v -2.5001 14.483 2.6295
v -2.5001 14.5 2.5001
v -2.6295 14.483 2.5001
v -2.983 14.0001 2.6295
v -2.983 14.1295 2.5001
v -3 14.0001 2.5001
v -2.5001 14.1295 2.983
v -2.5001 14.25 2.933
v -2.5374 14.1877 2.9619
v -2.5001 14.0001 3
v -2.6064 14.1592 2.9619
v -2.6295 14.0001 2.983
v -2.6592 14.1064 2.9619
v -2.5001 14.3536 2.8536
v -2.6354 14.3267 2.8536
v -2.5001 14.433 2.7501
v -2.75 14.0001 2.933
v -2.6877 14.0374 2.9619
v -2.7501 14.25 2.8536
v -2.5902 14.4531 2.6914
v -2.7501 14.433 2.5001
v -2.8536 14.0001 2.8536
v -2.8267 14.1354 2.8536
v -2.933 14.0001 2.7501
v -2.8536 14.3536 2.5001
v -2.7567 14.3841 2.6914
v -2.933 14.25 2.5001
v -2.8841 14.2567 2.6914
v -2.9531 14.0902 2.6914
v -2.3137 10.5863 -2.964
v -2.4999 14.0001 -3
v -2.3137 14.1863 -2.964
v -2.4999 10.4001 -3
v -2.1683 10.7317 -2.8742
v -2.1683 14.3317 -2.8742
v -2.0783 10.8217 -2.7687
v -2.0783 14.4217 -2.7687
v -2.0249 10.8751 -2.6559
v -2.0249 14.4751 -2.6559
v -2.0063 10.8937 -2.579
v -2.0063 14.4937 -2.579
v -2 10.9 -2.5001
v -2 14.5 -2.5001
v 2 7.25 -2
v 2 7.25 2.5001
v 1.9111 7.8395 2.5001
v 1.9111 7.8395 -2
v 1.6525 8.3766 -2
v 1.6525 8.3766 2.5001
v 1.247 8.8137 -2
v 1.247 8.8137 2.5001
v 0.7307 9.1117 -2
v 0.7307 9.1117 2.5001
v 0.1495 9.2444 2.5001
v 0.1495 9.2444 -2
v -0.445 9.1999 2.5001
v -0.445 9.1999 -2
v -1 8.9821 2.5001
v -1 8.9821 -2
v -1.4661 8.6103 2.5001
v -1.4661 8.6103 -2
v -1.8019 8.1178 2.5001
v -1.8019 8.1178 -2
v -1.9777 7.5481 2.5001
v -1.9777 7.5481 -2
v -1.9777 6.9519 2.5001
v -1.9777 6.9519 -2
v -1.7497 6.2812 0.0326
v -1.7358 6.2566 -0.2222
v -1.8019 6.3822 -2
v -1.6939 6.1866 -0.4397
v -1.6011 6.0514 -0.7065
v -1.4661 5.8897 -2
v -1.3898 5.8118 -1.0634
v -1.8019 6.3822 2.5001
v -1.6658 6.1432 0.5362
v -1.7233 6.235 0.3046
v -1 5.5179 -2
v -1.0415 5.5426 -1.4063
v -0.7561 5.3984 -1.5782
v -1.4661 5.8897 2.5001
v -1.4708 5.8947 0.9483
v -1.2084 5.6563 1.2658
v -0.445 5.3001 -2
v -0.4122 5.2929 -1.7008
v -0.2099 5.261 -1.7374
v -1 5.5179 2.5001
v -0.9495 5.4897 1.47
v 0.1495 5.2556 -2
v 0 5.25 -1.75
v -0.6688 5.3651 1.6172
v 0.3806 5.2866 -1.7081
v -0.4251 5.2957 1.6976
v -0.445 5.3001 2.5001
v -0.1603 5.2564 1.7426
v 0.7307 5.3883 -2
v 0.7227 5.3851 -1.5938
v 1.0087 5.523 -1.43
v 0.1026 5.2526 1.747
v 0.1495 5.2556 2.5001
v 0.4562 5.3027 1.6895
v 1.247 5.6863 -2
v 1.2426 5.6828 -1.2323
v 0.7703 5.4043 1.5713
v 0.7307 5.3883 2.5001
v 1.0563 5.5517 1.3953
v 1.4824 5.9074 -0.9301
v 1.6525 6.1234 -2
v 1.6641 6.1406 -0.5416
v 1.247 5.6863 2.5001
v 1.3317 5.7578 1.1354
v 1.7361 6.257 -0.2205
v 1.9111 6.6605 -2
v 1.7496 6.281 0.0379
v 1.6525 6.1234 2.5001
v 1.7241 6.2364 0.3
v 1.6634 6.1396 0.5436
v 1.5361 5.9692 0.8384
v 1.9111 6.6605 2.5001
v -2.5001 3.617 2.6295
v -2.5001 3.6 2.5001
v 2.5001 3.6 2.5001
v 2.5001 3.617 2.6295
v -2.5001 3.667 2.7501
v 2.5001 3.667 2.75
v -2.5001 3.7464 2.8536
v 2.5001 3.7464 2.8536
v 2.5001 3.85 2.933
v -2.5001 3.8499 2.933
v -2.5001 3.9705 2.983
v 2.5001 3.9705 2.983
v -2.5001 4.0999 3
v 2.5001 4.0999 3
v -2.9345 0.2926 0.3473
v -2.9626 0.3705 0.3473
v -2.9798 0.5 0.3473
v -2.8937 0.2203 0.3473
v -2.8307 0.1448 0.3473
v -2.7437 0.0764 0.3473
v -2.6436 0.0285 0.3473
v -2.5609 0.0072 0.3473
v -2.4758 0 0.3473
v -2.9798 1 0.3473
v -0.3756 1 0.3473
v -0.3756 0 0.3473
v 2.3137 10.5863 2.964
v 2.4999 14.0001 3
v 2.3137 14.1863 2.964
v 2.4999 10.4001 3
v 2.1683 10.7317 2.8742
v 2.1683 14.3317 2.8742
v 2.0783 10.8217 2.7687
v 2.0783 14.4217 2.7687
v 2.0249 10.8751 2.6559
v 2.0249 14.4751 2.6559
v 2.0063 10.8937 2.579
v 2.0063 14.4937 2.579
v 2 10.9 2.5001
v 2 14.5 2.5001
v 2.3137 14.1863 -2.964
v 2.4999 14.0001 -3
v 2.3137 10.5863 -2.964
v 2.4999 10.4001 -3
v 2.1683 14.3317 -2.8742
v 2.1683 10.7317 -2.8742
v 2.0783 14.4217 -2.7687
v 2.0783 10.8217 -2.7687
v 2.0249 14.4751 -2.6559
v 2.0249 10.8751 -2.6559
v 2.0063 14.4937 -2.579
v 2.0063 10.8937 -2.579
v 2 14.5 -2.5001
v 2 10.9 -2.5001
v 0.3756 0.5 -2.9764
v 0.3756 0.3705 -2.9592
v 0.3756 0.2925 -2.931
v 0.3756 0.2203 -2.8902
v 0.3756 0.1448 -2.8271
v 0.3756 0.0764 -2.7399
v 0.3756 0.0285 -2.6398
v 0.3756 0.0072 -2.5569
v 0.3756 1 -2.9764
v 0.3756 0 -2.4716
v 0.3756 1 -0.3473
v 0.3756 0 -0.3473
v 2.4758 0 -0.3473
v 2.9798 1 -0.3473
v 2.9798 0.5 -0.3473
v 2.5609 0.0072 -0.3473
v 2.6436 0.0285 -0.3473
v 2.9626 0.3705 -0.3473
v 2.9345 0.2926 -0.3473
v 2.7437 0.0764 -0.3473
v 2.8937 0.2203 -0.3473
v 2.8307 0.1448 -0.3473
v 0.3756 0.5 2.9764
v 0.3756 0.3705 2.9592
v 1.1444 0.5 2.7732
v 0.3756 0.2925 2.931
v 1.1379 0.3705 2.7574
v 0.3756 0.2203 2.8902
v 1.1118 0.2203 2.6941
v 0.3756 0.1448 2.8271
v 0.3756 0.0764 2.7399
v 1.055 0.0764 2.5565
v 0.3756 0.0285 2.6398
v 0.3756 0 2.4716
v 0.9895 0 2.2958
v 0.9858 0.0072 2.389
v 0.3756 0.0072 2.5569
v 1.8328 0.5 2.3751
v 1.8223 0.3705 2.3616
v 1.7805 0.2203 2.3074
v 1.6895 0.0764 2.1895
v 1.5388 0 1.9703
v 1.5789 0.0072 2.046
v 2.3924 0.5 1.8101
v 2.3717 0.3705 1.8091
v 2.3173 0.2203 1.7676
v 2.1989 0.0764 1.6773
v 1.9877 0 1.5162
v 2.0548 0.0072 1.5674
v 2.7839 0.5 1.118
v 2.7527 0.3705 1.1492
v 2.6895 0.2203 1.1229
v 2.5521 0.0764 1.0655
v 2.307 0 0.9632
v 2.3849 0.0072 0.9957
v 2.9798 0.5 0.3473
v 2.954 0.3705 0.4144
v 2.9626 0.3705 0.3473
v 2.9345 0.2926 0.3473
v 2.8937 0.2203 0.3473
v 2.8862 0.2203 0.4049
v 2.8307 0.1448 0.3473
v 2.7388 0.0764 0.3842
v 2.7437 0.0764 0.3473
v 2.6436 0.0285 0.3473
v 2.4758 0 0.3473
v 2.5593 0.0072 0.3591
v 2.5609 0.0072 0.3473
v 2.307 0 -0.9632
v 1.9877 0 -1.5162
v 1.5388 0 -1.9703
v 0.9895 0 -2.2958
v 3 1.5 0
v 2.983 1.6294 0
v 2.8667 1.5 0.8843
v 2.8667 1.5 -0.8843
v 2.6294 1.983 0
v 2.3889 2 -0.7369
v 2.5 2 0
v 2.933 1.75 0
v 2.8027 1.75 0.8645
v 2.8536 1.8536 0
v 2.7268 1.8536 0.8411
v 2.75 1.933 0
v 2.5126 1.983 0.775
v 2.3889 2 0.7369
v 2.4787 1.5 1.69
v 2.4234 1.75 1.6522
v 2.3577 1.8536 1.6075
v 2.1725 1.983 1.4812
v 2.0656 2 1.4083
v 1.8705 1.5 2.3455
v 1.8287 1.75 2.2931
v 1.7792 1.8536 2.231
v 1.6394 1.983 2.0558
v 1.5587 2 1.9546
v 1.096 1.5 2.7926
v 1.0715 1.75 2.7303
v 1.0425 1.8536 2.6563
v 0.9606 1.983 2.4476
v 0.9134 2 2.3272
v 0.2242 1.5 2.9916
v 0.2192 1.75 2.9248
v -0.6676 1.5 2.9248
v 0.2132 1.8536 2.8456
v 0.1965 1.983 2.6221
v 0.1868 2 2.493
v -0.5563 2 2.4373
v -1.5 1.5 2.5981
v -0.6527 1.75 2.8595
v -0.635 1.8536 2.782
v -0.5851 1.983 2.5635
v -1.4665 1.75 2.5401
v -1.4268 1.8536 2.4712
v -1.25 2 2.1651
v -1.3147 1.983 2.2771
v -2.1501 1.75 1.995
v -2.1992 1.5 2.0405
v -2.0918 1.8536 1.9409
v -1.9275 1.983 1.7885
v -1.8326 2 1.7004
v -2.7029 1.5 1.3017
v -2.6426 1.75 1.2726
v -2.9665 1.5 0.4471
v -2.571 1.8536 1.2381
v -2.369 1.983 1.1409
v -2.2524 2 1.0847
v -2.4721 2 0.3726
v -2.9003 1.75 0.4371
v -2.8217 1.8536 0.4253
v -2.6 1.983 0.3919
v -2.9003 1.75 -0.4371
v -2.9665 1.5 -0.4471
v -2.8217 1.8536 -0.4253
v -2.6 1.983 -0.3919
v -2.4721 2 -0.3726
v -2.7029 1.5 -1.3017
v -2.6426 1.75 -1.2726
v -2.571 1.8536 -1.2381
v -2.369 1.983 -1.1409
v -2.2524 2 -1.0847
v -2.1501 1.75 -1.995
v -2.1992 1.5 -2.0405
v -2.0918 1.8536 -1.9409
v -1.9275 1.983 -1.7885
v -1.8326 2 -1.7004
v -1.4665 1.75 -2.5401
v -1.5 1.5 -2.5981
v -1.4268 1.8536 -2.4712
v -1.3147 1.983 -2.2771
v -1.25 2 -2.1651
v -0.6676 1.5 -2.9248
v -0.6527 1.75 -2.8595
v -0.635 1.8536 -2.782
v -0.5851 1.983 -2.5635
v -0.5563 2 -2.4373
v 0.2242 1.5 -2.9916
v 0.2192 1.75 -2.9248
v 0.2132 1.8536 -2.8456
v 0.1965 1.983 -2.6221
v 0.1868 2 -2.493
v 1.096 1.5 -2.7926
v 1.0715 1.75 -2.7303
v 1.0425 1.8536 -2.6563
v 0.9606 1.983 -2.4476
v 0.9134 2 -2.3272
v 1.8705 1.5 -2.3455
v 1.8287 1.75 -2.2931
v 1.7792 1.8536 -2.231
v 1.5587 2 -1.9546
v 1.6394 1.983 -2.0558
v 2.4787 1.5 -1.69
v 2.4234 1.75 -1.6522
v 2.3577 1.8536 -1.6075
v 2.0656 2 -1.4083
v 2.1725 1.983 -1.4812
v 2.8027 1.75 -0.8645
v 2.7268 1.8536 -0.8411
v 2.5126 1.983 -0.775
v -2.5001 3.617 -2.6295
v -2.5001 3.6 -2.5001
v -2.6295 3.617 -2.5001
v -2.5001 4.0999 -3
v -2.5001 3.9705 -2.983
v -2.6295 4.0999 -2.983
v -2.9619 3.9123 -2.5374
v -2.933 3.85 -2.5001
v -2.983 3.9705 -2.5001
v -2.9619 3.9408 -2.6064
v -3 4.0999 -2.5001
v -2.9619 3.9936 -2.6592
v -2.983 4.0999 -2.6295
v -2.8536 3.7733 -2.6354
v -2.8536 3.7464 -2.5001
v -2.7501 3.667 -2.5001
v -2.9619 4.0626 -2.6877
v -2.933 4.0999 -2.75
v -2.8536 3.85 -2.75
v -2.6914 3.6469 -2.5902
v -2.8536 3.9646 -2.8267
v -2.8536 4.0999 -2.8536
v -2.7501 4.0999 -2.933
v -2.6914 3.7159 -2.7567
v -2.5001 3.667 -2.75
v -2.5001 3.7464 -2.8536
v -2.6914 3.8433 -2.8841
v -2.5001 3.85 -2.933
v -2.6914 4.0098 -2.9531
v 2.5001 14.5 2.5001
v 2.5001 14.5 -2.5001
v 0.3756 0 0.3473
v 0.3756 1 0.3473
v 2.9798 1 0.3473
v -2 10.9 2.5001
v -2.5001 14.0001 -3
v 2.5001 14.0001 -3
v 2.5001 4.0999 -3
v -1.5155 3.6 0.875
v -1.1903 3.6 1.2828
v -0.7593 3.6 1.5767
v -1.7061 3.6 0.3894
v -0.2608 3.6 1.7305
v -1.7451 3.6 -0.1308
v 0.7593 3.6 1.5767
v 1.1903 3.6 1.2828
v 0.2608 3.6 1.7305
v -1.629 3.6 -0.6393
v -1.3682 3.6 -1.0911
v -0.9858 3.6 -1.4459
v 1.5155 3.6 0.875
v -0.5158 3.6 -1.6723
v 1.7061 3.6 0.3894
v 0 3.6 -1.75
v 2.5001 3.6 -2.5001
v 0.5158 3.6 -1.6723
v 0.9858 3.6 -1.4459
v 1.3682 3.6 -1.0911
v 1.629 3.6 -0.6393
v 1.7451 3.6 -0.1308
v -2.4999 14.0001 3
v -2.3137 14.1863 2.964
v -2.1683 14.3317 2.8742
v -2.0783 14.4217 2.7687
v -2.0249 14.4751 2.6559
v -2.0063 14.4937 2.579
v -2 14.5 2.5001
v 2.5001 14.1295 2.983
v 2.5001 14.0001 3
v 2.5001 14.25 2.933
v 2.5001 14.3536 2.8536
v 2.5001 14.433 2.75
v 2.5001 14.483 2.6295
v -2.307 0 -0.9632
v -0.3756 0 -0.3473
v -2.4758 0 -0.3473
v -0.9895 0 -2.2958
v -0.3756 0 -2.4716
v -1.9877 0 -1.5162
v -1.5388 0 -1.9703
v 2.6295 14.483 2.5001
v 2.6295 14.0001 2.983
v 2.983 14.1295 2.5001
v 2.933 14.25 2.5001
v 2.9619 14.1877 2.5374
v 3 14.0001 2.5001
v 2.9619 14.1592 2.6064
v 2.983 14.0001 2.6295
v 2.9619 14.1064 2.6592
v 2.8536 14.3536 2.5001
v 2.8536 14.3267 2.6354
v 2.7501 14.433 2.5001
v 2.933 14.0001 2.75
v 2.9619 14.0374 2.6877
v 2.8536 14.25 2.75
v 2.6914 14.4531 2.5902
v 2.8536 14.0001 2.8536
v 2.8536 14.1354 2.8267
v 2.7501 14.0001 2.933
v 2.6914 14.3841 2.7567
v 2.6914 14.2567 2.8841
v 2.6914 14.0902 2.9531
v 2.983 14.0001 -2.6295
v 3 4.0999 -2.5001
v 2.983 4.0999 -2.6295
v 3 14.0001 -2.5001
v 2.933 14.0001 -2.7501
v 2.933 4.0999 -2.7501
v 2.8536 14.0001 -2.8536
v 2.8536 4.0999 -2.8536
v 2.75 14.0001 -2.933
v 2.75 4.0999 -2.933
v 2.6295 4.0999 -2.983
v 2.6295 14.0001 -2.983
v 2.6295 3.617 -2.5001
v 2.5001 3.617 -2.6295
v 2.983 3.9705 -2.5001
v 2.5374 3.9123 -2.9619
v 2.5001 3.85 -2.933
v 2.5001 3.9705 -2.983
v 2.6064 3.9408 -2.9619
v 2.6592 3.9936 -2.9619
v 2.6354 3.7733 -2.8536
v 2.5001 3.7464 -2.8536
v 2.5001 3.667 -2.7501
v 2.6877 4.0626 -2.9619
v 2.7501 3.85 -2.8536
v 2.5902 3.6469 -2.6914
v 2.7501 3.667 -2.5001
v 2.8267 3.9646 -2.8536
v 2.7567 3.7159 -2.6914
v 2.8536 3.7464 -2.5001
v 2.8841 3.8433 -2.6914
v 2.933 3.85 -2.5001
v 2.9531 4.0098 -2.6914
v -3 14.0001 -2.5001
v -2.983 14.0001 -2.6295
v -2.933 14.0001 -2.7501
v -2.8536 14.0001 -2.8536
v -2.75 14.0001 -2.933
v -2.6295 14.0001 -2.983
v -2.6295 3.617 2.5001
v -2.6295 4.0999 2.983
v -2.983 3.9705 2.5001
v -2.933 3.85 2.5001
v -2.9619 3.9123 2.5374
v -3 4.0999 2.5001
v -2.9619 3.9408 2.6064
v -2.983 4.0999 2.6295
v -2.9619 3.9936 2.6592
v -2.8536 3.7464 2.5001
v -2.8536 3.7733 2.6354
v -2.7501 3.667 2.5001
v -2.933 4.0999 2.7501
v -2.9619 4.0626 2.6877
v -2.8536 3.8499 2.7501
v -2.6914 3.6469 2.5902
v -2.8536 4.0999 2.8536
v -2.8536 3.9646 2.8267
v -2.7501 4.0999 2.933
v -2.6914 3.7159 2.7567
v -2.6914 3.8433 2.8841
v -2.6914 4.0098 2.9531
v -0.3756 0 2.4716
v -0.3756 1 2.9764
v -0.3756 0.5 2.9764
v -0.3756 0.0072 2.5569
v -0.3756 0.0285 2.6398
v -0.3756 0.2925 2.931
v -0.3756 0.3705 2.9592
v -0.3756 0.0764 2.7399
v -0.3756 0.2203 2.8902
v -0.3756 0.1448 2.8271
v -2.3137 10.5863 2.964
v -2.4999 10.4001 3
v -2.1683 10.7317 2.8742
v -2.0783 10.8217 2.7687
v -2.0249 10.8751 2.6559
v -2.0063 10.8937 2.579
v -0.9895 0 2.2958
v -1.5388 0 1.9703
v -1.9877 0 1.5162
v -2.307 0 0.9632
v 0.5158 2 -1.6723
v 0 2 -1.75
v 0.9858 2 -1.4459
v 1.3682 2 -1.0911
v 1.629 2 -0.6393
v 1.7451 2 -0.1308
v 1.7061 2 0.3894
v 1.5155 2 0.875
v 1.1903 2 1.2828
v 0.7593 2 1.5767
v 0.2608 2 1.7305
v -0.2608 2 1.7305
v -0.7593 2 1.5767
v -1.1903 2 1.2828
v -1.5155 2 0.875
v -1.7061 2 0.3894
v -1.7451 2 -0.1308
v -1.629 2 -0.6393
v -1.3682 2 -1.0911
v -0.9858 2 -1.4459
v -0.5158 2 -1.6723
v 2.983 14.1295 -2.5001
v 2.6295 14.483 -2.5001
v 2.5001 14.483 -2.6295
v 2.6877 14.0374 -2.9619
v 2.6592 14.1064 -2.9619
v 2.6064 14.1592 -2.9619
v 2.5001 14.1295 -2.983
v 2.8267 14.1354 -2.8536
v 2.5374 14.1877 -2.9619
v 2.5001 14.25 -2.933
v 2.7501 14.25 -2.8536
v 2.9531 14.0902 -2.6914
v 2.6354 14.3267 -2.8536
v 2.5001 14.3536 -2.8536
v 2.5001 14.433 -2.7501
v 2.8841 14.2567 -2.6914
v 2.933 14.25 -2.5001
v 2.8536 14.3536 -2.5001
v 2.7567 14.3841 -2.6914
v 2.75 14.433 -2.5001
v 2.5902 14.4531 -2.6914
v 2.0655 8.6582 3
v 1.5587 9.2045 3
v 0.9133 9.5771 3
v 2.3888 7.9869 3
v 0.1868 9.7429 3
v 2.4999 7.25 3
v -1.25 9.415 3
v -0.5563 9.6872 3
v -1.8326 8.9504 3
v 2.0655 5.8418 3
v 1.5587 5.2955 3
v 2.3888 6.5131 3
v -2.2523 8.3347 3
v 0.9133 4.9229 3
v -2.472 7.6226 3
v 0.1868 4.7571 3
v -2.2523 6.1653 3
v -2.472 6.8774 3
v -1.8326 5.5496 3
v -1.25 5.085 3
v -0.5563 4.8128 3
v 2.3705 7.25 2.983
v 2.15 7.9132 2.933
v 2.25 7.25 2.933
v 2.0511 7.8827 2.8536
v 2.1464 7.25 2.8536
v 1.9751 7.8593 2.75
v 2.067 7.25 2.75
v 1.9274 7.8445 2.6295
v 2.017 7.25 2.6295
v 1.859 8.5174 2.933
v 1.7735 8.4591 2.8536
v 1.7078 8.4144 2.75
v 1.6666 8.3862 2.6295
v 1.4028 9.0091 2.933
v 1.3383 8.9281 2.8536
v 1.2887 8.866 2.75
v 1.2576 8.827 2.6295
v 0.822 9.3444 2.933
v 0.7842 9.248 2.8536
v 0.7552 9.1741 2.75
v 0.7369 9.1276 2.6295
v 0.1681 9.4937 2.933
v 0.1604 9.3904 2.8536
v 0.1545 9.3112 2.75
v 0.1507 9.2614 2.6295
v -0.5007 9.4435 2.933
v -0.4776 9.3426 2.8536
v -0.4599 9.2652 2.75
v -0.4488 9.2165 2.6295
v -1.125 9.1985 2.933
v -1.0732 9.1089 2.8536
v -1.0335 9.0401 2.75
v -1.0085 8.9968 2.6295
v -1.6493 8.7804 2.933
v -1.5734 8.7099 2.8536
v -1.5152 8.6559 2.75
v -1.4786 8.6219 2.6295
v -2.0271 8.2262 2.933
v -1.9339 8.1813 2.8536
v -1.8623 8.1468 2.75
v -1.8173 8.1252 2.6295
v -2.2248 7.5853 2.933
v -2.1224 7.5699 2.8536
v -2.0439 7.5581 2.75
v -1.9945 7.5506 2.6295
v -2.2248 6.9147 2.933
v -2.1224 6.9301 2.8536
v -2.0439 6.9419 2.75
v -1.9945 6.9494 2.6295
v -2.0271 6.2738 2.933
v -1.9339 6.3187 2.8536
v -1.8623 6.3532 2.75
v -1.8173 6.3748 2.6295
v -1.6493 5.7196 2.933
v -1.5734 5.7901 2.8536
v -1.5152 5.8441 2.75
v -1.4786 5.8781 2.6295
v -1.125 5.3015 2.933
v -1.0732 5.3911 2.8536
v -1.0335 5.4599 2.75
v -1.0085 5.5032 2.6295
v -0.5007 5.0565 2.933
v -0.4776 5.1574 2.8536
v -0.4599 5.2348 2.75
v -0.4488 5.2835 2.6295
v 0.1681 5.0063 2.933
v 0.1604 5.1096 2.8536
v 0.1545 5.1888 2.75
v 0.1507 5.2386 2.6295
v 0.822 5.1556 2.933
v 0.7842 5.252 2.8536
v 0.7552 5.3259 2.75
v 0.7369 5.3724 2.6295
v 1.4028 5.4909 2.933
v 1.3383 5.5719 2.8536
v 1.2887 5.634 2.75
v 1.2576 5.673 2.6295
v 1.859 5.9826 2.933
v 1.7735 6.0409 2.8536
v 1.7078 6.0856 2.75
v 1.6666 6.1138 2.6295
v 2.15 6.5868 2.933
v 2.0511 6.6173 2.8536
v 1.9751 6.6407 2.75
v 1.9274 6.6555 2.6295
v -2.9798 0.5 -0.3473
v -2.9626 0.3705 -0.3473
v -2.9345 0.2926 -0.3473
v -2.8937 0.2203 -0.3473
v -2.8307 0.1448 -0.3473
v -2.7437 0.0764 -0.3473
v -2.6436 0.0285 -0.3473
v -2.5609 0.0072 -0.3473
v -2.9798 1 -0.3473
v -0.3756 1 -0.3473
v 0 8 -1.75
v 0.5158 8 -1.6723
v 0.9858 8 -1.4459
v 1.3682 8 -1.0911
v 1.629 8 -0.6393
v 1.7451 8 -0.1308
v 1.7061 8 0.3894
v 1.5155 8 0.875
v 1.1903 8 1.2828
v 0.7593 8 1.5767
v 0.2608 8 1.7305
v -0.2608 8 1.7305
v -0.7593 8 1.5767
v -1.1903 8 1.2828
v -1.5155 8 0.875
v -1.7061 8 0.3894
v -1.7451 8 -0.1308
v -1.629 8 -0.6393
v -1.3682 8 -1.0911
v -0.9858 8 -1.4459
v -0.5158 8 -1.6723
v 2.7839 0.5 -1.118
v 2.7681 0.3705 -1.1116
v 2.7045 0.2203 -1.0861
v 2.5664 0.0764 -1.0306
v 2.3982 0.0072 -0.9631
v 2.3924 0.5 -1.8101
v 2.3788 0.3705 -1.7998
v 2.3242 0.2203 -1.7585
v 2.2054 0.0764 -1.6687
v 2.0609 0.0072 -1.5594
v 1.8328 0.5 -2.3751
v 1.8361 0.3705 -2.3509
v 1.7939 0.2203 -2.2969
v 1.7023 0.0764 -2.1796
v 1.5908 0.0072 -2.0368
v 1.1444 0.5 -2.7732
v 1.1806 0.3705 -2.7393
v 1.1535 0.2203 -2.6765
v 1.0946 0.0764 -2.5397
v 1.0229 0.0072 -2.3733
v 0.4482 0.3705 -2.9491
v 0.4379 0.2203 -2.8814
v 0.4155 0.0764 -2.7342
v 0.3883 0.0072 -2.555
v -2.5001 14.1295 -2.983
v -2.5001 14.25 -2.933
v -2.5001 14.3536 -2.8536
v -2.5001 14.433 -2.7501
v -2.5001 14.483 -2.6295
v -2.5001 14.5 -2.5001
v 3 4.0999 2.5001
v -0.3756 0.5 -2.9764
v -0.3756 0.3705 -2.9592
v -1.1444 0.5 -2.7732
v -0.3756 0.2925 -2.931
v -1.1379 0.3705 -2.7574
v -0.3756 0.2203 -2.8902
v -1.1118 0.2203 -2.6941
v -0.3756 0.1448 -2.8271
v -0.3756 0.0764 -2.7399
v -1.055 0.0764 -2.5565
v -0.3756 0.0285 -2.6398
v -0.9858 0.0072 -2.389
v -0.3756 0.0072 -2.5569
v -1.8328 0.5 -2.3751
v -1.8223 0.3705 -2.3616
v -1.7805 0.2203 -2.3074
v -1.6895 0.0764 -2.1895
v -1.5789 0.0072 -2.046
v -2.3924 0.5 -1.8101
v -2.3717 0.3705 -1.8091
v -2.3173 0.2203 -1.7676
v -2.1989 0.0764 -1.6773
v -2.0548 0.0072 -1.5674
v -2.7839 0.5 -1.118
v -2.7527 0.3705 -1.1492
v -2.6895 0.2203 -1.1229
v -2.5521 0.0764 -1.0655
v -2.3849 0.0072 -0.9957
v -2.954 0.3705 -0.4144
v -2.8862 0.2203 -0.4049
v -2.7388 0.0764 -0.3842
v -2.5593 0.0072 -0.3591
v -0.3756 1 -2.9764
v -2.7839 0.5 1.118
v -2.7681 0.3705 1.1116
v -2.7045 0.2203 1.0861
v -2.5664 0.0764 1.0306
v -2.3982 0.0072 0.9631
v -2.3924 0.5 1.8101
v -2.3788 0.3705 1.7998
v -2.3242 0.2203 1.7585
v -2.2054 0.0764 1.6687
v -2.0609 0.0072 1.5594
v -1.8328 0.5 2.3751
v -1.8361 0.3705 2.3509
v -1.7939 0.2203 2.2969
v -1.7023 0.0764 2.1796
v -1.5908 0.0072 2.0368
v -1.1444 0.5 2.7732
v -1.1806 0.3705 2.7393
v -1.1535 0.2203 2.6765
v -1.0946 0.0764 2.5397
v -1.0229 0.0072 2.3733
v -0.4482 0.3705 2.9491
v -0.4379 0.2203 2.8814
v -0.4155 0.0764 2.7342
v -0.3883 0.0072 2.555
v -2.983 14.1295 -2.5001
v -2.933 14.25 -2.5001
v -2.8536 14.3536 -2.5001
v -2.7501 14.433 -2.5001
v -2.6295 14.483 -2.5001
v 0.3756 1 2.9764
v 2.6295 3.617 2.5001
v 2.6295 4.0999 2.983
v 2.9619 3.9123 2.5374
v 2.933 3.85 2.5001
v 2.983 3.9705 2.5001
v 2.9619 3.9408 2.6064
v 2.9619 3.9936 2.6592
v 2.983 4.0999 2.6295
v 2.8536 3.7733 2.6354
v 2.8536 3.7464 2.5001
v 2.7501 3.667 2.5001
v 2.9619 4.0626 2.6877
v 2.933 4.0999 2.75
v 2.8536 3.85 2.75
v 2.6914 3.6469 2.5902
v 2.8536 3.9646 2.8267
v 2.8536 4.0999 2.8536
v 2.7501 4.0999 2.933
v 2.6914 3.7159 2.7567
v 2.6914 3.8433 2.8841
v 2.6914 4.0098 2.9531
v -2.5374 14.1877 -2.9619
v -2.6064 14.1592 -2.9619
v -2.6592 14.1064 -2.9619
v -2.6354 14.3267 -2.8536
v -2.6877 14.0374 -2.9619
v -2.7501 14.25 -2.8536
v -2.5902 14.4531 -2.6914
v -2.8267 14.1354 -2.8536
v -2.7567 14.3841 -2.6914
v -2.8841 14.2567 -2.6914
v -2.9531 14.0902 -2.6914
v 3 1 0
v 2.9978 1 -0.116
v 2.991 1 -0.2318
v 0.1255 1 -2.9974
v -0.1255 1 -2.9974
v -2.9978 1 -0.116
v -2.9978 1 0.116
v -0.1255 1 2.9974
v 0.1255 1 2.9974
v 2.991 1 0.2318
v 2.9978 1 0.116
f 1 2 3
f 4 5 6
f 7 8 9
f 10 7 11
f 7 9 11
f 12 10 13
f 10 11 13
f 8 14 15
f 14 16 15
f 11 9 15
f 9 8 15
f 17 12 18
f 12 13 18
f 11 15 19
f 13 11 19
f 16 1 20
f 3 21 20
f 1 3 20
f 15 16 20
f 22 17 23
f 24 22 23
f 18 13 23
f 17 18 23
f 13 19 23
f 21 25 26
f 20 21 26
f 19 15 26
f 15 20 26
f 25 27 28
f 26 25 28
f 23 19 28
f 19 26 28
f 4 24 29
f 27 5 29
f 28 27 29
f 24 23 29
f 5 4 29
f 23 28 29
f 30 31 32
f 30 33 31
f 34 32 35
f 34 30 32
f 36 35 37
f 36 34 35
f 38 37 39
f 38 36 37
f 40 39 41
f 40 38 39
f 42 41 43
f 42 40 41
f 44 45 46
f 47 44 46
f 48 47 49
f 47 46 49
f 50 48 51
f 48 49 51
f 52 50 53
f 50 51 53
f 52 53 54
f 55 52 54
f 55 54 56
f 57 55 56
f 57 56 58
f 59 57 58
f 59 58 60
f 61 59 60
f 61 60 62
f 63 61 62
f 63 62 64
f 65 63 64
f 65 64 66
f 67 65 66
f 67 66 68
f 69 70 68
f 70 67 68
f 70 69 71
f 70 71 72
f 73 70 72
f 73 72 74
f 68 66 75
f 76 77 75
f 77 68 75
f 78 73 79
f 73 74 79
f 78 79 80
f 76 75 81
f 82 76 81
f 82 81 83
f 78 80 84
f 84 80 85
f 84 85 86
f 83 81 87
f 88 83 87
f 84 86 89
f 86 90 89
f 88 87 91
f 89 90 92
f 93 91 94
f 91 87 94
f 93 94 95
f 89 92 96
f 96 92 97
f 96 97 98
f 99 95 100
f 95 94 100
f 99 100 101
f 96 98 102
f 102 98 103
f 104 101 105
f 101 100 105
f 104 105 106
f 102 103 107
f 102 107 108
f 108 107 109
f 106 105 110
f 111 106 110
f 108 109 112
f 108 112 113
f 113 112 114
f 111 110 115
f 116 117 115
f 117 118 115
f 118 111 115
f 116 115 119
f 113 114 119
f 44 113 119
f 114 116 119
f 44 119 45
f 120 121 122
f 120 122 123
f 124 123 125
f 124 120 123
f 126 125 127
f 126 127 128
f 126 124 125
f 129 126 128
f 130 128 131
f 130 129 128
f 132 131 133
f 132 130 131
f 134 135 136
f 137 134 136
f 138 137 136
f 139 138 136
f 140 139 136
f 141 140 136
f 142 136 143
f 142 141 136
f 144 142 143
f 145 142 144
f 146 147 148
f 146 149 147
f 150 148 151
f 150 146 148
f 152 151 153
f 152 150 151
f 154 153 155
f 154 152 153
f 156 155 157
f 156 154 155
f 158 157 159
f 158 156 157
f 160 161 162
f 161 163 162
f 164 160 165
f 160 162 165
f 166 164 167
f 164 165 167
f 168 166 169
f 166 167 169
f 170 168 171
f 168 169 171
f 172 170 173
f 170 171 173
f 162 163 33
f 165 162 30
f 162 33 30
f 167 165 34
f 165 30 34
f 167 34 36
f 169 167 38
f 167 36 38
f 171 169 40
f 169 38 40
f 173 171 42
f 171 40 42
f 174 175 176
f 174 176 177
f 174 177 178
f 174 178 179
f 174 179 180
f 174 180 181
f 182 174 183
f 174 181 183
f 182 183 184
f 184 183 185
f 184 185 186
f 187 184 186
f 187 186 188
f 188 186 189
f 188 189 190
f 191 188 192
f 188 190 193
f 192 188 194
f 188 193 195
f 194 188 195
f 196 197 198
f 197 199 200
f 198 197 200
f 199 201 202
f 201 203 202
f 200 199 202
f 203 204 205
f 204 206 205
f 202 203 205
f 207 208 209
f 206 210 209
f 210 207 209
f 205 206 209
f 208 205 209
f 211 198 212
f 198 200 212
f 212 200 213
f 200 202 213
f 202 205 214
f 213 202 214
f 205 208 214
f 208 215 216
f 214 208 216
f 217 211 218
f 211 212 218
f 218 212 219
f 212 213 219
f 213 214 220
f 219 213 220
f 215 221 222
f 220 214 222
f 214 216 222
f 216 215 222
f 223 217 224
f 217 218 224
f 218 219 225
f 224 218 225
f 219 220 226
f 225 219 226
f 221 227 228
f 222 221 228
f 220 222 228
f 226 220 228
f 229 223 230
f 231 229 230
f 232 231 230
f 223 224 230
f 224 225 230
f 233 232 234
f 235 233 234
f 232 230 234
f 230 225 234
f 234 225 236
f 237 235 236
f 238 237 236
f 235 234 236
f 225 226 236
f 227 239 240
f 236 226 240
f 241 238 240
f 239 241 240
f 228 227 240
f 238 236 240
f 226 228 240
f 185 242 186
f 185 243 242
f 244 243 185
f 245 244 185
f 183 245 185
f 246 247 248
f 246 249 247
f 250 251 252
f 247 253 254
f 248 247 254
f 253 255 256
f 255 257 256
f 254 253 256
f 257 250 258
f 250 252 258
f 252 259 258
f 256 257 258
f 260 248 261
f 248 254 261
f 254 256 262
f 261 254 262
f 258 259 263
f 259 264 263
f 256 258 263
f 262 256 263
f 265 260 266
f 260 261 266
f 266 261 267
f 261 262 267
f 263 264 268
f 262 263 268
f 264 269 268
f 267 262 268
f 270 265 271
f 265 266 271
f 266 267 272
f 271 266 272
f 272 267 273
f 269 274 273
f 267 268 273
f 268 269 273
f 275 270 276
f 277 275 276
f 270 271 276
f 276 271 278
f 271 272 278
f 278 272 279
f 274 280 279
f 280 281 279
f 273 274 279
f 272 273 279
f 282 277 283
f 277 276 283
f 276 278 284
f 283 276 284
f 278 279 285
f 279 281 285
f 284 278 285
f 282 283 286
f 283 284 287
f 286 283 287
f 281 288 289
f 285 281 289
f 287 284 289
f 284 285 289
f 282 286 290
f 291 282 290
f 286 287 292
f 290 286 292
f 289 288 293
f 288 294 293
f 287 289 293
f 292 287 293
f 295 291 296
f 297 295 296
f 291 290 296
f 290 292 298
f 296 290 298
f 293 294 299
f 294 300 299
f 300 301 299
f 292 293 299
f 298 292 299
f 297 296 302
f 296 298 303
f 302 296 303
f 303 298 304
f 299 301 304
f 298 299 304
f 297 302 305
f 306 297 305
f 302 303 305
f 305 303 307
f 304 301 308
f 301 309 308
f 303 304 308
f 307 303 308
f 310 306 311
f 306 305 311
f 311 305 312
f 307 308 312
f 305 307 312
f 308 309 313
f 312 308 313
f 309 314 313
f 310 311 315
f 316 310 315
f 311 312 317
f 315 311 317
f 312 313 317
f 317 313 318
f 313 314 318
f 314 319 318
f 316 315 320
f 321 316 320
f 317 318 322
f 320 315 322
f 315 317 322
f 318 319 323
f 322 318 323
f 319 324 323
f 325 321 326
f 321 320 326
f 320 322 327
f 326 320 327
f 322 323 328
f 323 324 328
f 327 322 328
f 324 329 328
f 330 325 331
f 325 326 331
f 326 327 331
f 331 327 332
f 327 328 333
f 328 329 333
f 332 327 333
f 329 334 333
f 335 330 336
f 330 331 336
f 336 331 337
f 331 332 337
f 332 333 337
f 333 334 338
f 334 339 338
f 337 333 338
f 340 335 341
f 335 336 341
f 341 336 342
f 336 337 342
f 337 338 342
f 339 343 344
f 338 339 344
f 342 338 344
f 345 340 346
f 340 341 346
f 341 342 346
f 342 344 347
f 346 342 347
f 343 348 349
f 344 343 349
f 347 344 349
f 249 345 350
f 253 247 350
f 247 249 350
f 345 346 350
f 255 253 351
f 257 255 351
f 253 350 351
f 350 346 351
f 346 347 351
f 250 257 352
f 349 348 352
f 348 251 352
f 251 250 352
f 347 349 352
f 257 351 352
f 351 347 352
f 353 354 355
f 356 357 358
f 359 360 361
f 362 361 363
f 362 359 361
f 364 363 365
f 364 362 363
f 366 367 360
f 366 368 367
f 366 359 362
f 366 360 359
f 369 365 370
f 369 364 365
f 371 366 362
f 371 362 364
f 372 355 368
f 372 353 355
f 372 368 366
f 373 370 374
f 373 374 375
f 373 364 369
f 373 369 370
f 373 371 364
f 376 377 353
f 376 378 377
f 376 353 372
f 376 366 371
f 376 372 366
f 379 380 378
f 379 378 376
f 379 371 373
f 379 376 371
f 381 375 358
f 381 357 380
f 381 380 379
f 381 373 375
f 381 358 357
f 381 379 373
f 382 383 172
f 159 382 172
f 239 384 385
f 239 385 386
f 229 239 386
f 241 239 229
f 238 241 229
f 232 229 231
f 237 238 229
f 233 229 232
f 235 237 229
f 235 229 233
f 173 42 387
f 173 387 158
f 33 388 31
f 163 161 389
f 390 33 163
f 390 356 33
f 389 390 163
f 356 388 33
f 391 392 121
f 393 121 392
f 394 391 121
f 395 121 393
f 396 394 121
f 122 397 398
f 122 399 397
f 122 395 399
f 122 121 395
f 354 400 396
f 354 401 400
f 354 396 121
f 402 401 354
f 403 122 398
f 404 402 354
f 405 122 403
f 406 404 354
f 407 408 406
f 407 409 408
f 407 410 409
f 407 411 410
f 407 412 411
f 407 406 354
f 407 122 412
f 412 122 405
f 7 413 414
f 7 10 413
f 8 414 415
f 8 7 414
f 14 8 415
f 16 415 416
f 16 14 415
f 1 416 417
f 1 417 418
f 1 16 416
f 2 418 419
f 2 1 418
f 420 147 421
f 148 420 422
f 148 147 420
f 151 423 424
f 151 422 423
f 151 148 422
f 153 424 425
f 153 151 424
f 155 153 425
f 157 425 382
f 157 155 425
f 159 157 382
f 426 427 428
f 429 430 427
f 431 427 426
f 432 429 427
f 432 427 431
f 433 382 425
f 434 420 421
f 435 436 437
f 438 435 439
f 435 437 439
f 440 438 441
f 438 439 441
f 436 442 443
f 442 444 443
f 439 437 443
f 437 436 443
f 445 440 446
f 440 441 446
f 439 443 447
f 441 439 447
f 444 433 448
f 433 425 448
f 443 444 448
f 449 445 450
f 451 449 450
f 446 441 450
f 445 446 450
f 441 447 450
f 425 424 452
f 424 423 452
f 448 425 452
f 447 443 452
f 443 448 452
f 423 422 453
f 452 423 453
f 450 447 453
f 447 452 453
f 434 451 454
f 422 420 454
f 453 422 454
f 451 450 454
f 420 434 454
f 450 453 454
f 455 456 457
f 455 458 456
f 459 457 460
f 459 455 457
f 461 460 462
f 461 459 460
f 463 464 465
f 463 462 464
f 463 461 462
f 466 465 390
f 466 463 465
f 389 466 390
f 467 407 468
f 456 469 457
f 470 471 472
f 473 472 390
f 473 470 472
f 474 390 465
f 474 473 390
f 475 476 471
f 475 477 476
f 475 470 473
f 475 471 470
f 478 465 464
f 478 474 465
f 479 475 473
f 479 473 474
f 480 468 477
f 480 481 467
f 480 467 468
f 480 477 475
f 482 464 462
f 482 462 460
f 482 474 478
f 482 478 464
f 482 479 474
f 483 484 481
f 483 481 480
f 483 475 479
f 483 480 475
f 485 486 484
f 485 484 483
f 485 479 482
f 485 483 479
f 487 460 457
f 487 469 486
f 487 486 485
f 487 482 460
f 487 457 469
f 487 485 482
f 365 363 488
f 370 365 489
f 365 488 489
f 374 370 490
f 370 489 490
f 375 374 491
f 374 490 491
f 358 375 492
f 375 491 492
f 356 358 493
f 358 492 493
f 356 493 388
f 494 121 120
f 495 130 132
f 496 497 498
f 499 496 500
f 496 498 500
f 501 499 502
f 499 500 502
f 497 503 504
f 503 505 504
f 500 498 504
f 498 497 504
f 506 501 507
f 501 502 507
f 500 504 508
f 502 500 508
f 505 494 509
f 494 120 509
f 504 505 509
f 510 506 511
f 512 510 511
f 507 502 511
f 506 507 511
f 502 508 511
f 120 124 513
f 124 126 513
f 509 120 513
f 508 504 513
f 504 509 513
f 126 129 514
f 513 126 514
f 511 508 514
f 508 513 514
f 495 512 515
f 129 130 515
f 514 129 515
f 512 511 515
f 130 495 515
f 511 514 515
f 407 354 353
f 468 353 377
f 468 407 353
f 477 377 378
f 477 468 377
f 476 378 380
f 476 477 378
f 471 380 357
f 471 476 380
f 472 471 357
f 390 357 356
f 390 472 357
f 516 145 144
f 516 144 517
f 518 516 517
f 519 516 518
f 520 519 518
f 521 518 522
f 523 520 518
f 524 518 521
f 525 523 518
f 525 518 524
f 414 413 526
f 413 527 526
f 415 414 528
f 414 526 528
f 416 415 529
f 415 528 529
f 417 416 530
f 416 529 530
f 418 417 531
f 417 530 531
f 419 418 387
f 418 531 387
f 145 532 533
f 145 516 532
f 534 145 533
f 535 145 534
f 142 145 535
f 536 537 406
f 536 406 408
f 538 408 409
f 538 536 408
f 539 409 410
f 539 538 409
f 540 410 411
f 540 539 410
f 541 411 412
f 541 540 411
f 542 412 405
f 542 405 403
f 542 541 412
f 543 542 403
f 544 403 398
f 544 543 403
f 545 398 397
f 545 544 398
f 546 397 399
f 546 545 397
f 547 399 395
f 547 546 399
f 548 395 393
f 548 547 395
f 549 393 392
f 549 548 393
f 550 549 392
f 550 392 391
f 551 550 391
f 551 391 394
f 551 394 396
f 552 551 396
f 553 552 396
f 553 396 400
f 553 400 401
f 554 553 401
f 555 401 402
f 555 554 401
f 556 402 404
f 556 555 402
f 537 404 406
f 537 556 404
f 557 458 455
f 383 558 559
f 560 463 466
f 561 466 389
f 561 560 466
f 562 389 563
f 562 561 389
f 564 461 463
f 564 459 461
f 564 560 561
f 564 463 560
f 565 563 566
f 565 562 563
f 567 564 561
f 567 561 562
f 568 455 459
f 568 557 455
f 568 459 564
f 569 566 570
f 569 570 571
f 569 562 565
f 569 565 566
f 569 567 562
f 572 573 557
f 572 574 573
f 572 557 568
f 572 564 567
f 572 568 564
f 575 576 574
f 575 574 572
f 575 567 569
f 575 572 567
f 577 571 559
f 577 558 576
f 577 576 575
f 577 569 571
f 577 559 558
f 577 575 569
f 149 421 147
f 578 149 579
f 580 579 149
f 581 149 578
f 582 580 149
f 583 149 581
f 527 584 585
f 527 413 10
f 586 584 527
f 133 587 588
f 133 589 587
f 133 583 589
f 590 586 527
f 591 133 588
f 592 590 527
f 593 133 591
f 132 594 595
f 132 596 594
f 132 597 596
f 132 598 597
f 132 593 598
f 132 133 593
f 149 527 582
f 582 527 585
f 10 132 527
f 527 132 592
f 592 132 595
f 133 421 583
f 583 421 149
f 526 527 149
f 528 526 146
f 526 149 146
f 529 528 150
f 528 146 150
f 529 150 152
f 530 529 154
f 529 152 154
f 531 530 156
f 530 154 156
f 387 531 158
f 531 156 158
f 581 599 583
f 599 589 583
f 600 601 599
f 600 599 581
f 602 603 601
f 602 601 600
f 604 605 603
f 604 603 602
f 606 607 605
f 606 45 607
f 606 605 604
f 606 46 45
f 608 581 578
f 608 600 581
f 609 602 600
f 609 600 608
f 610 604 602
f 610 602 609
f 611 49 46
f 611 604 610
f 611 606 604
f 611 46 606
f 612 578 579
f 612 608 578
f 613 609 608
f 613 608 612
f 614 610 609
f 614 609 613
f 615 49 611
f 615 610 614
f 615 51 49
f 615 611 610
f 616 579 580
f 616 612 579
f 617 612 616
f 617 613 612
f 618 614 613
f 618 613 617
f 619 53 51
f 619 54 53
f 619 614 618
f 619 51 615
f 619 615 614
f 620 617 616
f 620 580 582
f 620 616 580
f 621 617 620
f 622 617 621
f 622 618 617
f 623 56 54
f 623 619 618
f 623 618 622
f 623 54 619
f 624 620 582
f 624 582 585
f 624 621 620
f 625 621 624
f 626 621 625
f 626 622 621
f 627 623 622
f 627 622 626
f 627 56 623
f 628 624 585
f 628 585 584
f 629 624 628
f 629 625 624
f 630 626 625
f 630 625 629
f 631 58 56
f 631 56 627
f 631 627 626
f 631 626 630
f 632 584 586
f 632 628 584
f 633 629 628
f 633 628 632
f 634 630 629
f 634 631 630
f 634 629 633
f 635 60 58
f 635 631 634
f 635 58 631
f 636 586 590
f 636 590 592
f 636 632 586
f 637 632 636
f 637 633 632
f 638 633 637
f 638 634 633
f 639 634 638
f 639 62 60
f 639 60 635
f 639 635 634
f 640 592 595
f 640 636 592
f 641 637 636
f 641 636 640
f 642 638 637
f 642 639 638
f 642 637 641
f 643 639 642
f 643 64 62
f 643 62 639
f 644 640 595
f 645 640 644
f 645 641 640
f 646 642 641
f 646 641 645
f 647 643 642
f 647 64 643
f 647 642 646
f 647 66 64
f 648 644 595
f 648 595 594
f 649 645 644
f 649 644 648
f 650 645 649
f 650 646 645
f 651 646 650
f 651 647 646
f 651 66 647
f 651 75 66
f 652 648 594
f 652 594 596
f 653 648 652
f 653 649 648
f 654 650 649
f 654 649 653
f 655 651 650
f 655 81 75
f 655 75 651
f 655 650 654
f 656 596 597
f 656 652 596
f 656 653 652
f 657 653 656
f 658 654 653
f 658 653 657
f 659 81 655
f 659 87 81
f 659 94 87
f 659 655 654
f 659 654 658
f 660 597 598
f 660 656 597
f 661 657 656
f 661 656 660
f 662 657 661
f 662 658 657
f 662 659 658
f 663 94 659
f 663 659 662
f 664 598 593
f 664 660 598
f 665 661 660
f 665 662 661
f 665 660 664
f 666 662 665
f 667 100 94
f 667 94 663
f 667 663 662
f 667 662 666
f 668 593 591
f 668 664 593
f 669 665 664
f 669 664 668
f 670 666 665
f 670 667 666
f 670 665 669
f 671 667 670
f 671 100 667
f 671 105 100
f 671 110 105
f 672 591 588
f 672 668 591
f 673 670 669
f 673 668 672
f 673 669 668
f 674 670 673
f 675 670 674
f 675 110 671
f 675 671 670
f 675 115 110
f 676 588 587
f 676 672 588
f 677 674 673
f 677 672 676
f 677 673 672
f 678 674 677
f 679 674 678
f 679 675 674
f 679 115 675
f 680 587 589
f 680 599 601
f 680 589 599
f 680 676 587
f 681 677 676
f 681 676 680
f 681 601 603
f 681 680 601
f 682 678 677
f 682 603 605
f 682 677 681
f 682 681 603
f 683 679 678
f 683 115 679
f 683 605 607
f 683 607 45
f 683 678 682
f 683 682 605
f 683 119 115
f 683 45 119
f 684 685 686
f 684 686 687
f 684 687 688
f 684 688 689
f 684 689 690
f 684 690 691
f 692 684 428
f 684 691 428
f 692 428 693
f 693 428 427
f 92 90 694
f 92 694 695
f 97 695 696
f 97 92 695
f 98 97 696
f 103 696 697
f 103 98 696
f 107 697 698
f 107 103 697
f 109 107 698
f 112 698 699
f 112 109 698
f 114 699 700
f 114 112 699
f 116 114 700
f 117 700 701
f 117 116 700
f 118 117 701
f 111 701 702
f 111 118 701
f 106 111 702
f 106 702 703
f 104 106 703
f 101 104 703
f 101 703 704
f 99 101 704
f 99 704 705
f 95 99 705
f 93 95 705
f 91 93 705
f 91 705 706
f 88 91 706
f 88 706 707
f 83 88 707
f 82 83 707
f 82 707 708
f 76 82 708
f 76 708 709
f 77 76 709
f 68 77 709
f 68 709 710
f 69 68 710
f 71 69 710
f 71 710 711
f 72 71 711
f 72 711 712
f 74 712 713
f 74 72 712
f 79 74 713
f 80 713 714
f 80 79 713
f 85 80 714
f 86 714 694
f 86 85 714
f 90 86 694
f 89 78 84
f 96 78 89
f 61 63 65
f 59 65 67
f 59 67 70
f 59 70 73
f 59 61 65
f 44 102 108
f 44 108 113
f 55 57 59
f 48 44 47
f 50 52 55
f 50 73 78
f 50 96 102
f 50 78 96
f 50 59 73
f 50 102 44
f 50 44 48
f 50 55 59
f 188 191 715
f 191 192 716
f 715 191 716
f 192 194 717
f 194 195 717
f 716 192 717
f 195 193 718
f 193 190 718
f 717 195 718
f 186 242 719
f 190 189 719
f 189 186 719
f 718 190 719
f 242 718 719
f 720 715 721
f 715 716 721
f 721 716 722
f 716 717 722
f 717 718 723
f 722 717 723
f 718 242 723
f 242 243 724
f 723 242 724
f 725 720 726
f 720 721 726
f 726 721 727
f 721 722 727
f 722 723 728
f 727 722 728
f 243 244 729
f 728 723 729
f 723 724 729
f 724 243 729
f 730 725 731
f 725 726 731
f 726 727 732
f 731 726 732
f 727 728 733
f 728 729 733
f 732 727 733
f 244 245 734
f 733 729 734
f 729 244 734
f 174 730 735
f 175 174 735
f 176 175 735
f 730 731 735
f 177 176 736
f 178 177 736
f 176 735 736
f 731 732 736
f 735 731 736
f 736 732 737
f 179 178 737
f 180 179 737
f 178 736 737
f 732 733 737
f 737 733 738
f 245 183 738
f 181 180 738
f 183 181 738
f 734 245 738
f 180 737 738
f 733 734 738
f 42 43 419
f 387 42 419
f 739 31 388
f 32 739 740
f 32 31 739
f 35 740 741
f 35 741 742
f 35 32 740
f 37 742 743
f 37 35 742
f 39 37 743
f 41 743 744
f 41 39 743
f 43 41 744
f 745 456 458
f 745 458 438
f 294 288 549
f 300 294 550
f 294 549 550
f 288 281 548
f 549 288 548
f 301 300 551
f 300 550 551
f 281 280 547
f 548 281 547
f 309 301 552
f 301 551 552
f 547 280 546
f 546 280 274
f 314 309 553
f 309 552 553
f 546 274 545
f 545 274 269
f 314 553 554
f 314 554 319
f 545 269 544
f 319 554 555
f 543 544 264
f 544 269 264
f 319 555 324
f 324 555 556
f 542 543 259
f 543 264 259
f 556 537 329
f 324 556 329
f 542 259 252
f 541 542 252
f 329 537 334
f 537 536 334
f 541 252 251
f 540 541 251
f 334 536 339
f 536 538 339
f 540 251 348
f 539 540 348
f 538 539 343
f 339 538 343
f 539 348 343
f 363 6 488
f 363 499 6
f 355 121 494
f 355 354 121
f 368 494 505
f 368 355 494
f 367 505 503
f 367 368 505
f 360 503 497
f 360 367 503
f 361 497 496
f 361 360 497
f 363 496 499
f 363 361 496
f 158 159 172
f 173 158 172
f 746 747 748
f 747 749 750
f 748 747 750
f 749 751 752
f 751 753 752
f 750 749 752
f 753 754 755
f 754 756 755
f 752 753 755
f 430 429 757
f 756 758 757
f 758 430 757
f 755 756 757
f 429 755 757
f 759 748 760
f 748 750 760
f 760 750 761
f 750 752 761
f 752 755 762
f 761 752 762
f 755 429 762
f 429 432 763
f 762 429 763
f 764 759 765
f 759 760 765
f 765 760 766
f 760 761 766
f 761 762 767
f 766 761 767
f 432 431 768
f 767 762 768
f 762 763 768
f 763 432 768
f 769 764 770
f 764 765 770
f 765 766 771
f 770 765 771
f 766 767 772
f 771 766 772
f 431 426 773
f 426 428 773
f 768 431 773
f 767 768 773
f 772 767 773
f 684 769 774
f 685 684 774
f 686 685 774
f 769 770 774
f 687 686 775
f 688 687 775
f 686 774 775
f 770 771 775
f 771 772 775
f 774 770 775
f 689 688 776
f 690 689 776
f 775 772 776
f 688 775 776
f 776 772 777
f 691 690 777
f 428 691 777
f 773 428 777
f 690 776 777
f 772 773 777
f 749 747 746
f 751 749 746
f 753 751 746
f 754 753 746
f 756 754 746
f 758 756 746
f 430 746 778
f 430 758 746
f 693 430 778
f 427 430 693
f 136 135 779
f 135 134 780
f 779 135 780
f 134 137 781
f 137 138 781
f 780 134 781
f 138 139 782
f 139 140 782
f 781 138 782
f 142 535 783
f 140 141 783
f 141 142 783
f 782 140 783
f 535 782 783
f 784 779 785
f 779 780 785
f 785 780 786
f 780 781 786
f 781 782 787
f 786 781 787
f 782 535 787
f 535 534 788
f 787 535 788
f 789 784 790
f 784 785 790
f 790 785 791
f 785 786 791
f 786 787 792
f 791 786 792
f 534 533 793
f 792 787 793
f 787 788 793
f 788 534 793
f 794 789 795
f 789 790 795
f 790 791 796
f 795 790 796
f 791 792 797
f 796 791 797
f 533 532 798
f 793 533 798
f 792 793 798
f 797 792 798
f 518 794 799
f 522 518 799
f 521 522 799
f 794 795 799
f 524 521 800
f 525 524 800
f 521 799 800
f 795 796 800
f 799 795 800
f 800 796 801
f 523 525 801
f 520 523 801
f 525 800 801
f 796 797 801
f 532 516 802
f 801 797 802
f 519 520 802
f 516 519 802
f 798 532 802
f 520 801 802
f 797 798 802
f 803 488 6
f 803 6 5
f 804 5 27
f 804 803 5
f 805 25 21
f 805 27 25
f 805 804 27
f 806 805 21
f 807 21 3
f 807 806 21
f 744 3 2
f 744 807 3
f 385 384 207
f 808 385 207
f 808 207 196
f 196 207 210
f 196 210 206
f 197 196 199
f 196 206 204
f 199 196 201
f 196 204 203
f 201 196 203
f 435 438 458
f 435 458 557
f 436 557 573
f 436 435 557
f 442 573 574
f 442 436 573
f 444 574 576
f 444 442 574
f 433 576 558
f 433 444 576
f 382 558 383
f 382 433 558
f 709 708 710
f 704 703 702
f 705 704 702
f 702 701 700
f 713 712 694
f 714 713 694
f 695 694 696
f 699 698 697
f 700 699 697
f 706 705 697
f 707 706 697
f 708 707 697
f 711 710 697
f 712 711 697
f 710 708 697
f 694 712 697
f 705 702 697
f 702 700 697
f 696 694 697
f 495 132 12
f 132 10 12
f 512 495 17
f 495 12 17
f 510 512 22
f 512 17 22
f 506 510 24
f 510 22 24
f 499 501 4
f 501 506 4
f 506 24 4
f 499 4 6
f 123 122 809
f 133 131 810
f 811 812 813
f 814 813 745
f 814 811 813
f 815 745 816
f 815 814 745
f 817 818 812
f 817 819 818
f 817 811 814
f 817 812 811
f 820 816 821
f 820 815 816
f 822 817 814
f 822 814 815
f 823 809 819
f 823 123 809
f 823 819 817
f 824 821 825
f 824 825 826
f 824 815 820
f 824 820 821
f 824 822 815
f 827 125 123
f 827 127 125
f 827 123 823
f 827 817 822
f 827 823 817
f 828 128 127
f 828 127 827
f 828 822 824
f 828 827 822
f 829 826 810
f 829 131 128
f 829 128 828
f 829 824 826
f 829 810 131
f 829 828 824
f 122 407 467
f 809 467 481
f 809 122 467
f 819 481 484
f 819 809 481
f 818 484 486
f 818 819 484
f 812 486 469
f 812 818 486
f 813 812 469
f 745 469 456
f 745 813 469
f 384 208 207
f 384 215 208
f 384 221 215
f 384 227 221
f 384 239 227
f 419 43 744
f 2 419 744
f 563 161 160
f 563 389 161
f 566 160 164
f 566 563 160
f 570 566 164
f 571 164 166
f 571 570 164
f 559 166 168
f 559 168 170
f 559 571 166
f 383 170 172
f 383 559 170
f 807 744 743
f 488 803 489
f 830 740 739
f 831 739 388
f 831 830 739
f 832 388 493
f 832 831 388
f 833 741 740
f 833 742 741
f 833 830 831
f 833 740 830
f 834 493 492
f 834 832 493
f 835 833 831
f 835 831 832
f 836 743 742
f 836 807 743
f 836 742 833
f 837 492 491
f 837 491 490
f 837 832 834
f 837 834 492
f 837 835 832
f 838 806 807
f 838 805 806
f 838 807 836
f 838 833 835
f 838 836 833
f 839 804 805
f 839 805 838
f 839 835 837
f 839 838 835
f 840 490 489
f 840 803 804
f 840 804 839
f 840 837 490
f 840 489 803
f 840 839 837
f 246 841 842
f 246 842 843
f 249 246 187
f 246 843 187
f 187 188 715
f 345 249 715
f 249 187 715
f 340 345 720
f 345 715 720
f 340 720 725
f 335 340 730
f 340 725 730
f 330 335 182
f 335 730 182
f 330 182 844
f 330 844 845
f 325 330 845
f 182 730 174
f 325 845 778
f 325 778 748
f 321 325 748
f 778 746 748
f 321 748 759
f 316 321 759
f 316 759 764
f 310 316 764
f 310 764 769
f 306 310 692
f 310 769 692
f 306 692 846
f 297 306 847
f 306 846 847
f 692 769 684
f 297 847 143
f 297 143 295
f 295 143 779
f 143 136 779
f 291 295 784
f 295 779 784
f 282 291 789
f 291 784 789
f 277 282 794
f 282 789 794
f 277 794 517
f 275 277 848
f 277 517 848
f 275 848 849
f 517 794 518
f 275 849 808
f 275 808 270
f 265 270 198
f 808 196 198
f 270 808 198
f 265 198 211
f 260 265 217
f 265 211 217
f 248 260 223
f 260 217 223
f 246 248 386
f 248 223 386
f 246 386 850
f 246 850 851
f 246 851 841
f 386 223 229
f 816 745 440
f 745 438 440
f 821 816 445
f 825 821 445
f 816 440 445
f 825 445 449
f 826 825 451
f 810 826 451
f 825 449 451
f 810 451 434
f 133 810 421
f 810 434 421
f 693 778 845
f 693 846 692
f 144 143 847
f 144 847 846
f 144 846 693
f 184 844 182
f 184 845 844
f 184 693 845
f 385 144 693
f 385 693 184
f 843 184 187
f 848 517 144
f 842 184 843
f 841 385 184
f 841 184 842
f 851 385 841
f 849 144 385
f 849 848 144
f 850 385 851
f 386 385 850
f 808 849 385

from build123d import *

# Parameters (mm, degrees)
BOSS_EXTRUDE1_DEPTH = 14.5
CUT_EXTRUDE1_DEPTH  = 3.6
CUT_EXTRUDE2_DEPTH  = 3.6
CUT_EXTRUDE3_START  = -2
SKETCH4_R           = 3.0000000000000004
SKETCH4_R_2         = 1.75
CUT_EXTRUDE3_DEPTH  = 1.6
SKETCH5_R           = 2
CUT_EXTRUDE4_DEPTH  = 5
FILLET1_R           = 0.5
FILLET3_R           = 0.5
SKETCH6_W           = 0.7512194361763478
SKETCH6_H           = 6
CUT_EXTRUDE5_DEPTH  = 1
SKETCH7_W           = 7.9403086641005265
SKETCH7_H           = 0.6946760377543701
CUT_EXTRUDE6_DEPTH  = 1
SKETCH8_R           = 1.75
BOSS_EXTRUDE2_DEPTH = 7


with BuildPart() as part:
    # Sketch1 → Boss-Extrude1 (new body)
    with BuildSketch(Plane(origin=(0, 0, 0), x_dir=(1, 0, 0), z_dir=(0, 1, 0))):
        Polygon((-3.0000000000000004, 3), (2.9999999999999996, 3), (3.0000000000000004, -3), (-2.9999999999999996, -3), align=None)
    extrude(amount=BOSS_EXTRUDE1_DEPTH)

    # Sketch2 → Cut-Extrude1 (cut)
    with BuildSketch(Plane(origin=(0, 14.5, 0), x_dir=(1, 0, 0), z_dir=(0, 1, 0))):
        Polygon((2, 3), (-2, 3), (-2, -3), (2, -2.9999999999999982), align=None)
    extrude(amount=-CUT_EXTRUDE1_DEPTH, mode=Mode.SUBTRACT)

    # Sketch3 → Cut-Extrude2 (cut)
    with BuildSketch(Plane.XZ):
        with BuildLine():
            ThreePointArc((-4.6684e-13, -3), (-2.121320343559808, -2.1213203435594776), (-3, 3.7e-16))
            Line((-2.9999999999999996, -2.22e-15), (-2.9999999999999996, -3))
            Line((-2.9999999999999996, -3), (-4.6674e-13, -3))
        make_face()
        with BuildLine():
            Line((2.9999999999999996, -3), (2.9999999999999996, 0))
            ThreePointArc((3, -7.3e-16), (2.121320343559478, -2.121320343559807), (-4.6684e-13, -3))
            Line((-4.6674e-13, -3), (2.9999999999999996, -3))
        make_face()
        with BuildLine():
            Line((2.9999999999999996, 3), (-4.6763e-13, 3))
            ThreePointArc((-4.6678e-13, 3), (2.1213203435594776, 2.1213203435598076), (3, 0))
            Line((2.9999999999999996, 0), (2.9999999999999996, 3))
        make_face()
        with BuildLine():
            Line((-4.6763e-13, 3), (-2.9999999999999996, 3))
            Line((-2.9999999999999996, 3), (-2.9999999999999996, -2.22e-15))
            ThreePointArc((-3, 3.7e-16), (-2.121320343559808, 2.1213203435594767), (-4.6744e-13, 3))
        make_face()
    extrude(amount=-CUT_EXTRUDE2_DEPTH, mode=Mode.SUBTRACT)

    # Sketch4 → Cut-Extrude3 (cut)
    with BuildSketch(Plane.XZ.offset(CUT_EXTRUDE3_START)):
        with Locations(Location((0, 0, 0), (0, 0, 270))):
            Circle(SKETCH4_R)
        with Locations(Location((0, 0, 0), (0, 0, 270))):
            Circle(SKETCH4_R_2, mode=Mode.SUBTRACT)
    extrude(amount=-CUT_EXTRUDE3_DEPTH, mode=Mode.SUBTRACT)

    # Sketch5 → Cut-Extrude4 (cut)
    with BuildSketch(Plane.XY.offset(3)):
        with Locations((0, 7.249999999999999)):
            Circle(SKETCH5_R)
    extrude(amount=-CUT_EXTRUDE4_DEPTH, mode=Mode.SUBTRACT)

    # Fillet1
    fillet1_edges = [part.edges().sort_by_distance(p)[0] for p in [
        (-3, 0, 5.9e-16),
        (-3.0000000000000004, 2, 3.82e-15),
    ]]
    fillet(fillet1_edges, radius=FILLET1_R)

    # Fillet3
    fillet3_edges = [part.edges().sort_by_distance(p)[0] for p in [
        (-3, 14.5, 0),
        (-2.5, 14.5, -3),
        (2.5, 14.5, 3),
        (-2.4999999999999996, 14.5, 3),
        (-2, 12.7, 3),
        (0, 10.9, -3),
        (-2, 12.7, -3),
        (2, 12.7, -3),
        (0, 10.9, 2.999999999999999),
        (2, 12.7, 2.9999999999999982),
        (0, 3.6, 3),
        (2.9999999999999996, 3.6, 0),
        (3, 14.5, 0),
        (0, 3.6, -3),
        (-2.9999999999999996, 3.6, 0),
        (3.0000000000000004, 9.05, 3),
        (-2.9999999999999996, 9.05, 3),
        (-3.0000000000000004, 9.05, -3),
        (2.9999999999999996, 9.05, -3),
        (2.4999999999999996, 14.5, -3),
        (-2, 7.249999999999999, 3),
    ]]
    fillet(fillet3_edges, radius=FILLET3_R - 0.0001)  # a hair under: the kernel refuses the full size

    # Sketch6 → Cut-Extrude5 (cut)
    with BuildSketch(Plane.XZ):
        Rectangle(SKETCH6_W, SKETCH6_H)
    extrude(amount=-CUT_EXTRUDE5_DEPTH, mode=Mode.SUBTRACT)

    # Sketch7 → Cut-Extrude6 (cut)
    with BuildSketch(Plane.XZ):
        Rectangle(SKETCH7_W, SKETCH7_H)
    extrude(amount=-CUT_EXTRUDE6_DEPTH, mode=Mode.SUBTRACT)

    # Sketch8 → Boss-Extrude2 (add)
    with BuildSketch(Plane.XZ.offset(-1)):
        with Locations(Location((0, 0, 0), (0, 0, 270))):
            Circle(SKETCH8_R)
    extrude(amount=-BOSS_EXTRUDE2_DEPTH)


solid = part.part
